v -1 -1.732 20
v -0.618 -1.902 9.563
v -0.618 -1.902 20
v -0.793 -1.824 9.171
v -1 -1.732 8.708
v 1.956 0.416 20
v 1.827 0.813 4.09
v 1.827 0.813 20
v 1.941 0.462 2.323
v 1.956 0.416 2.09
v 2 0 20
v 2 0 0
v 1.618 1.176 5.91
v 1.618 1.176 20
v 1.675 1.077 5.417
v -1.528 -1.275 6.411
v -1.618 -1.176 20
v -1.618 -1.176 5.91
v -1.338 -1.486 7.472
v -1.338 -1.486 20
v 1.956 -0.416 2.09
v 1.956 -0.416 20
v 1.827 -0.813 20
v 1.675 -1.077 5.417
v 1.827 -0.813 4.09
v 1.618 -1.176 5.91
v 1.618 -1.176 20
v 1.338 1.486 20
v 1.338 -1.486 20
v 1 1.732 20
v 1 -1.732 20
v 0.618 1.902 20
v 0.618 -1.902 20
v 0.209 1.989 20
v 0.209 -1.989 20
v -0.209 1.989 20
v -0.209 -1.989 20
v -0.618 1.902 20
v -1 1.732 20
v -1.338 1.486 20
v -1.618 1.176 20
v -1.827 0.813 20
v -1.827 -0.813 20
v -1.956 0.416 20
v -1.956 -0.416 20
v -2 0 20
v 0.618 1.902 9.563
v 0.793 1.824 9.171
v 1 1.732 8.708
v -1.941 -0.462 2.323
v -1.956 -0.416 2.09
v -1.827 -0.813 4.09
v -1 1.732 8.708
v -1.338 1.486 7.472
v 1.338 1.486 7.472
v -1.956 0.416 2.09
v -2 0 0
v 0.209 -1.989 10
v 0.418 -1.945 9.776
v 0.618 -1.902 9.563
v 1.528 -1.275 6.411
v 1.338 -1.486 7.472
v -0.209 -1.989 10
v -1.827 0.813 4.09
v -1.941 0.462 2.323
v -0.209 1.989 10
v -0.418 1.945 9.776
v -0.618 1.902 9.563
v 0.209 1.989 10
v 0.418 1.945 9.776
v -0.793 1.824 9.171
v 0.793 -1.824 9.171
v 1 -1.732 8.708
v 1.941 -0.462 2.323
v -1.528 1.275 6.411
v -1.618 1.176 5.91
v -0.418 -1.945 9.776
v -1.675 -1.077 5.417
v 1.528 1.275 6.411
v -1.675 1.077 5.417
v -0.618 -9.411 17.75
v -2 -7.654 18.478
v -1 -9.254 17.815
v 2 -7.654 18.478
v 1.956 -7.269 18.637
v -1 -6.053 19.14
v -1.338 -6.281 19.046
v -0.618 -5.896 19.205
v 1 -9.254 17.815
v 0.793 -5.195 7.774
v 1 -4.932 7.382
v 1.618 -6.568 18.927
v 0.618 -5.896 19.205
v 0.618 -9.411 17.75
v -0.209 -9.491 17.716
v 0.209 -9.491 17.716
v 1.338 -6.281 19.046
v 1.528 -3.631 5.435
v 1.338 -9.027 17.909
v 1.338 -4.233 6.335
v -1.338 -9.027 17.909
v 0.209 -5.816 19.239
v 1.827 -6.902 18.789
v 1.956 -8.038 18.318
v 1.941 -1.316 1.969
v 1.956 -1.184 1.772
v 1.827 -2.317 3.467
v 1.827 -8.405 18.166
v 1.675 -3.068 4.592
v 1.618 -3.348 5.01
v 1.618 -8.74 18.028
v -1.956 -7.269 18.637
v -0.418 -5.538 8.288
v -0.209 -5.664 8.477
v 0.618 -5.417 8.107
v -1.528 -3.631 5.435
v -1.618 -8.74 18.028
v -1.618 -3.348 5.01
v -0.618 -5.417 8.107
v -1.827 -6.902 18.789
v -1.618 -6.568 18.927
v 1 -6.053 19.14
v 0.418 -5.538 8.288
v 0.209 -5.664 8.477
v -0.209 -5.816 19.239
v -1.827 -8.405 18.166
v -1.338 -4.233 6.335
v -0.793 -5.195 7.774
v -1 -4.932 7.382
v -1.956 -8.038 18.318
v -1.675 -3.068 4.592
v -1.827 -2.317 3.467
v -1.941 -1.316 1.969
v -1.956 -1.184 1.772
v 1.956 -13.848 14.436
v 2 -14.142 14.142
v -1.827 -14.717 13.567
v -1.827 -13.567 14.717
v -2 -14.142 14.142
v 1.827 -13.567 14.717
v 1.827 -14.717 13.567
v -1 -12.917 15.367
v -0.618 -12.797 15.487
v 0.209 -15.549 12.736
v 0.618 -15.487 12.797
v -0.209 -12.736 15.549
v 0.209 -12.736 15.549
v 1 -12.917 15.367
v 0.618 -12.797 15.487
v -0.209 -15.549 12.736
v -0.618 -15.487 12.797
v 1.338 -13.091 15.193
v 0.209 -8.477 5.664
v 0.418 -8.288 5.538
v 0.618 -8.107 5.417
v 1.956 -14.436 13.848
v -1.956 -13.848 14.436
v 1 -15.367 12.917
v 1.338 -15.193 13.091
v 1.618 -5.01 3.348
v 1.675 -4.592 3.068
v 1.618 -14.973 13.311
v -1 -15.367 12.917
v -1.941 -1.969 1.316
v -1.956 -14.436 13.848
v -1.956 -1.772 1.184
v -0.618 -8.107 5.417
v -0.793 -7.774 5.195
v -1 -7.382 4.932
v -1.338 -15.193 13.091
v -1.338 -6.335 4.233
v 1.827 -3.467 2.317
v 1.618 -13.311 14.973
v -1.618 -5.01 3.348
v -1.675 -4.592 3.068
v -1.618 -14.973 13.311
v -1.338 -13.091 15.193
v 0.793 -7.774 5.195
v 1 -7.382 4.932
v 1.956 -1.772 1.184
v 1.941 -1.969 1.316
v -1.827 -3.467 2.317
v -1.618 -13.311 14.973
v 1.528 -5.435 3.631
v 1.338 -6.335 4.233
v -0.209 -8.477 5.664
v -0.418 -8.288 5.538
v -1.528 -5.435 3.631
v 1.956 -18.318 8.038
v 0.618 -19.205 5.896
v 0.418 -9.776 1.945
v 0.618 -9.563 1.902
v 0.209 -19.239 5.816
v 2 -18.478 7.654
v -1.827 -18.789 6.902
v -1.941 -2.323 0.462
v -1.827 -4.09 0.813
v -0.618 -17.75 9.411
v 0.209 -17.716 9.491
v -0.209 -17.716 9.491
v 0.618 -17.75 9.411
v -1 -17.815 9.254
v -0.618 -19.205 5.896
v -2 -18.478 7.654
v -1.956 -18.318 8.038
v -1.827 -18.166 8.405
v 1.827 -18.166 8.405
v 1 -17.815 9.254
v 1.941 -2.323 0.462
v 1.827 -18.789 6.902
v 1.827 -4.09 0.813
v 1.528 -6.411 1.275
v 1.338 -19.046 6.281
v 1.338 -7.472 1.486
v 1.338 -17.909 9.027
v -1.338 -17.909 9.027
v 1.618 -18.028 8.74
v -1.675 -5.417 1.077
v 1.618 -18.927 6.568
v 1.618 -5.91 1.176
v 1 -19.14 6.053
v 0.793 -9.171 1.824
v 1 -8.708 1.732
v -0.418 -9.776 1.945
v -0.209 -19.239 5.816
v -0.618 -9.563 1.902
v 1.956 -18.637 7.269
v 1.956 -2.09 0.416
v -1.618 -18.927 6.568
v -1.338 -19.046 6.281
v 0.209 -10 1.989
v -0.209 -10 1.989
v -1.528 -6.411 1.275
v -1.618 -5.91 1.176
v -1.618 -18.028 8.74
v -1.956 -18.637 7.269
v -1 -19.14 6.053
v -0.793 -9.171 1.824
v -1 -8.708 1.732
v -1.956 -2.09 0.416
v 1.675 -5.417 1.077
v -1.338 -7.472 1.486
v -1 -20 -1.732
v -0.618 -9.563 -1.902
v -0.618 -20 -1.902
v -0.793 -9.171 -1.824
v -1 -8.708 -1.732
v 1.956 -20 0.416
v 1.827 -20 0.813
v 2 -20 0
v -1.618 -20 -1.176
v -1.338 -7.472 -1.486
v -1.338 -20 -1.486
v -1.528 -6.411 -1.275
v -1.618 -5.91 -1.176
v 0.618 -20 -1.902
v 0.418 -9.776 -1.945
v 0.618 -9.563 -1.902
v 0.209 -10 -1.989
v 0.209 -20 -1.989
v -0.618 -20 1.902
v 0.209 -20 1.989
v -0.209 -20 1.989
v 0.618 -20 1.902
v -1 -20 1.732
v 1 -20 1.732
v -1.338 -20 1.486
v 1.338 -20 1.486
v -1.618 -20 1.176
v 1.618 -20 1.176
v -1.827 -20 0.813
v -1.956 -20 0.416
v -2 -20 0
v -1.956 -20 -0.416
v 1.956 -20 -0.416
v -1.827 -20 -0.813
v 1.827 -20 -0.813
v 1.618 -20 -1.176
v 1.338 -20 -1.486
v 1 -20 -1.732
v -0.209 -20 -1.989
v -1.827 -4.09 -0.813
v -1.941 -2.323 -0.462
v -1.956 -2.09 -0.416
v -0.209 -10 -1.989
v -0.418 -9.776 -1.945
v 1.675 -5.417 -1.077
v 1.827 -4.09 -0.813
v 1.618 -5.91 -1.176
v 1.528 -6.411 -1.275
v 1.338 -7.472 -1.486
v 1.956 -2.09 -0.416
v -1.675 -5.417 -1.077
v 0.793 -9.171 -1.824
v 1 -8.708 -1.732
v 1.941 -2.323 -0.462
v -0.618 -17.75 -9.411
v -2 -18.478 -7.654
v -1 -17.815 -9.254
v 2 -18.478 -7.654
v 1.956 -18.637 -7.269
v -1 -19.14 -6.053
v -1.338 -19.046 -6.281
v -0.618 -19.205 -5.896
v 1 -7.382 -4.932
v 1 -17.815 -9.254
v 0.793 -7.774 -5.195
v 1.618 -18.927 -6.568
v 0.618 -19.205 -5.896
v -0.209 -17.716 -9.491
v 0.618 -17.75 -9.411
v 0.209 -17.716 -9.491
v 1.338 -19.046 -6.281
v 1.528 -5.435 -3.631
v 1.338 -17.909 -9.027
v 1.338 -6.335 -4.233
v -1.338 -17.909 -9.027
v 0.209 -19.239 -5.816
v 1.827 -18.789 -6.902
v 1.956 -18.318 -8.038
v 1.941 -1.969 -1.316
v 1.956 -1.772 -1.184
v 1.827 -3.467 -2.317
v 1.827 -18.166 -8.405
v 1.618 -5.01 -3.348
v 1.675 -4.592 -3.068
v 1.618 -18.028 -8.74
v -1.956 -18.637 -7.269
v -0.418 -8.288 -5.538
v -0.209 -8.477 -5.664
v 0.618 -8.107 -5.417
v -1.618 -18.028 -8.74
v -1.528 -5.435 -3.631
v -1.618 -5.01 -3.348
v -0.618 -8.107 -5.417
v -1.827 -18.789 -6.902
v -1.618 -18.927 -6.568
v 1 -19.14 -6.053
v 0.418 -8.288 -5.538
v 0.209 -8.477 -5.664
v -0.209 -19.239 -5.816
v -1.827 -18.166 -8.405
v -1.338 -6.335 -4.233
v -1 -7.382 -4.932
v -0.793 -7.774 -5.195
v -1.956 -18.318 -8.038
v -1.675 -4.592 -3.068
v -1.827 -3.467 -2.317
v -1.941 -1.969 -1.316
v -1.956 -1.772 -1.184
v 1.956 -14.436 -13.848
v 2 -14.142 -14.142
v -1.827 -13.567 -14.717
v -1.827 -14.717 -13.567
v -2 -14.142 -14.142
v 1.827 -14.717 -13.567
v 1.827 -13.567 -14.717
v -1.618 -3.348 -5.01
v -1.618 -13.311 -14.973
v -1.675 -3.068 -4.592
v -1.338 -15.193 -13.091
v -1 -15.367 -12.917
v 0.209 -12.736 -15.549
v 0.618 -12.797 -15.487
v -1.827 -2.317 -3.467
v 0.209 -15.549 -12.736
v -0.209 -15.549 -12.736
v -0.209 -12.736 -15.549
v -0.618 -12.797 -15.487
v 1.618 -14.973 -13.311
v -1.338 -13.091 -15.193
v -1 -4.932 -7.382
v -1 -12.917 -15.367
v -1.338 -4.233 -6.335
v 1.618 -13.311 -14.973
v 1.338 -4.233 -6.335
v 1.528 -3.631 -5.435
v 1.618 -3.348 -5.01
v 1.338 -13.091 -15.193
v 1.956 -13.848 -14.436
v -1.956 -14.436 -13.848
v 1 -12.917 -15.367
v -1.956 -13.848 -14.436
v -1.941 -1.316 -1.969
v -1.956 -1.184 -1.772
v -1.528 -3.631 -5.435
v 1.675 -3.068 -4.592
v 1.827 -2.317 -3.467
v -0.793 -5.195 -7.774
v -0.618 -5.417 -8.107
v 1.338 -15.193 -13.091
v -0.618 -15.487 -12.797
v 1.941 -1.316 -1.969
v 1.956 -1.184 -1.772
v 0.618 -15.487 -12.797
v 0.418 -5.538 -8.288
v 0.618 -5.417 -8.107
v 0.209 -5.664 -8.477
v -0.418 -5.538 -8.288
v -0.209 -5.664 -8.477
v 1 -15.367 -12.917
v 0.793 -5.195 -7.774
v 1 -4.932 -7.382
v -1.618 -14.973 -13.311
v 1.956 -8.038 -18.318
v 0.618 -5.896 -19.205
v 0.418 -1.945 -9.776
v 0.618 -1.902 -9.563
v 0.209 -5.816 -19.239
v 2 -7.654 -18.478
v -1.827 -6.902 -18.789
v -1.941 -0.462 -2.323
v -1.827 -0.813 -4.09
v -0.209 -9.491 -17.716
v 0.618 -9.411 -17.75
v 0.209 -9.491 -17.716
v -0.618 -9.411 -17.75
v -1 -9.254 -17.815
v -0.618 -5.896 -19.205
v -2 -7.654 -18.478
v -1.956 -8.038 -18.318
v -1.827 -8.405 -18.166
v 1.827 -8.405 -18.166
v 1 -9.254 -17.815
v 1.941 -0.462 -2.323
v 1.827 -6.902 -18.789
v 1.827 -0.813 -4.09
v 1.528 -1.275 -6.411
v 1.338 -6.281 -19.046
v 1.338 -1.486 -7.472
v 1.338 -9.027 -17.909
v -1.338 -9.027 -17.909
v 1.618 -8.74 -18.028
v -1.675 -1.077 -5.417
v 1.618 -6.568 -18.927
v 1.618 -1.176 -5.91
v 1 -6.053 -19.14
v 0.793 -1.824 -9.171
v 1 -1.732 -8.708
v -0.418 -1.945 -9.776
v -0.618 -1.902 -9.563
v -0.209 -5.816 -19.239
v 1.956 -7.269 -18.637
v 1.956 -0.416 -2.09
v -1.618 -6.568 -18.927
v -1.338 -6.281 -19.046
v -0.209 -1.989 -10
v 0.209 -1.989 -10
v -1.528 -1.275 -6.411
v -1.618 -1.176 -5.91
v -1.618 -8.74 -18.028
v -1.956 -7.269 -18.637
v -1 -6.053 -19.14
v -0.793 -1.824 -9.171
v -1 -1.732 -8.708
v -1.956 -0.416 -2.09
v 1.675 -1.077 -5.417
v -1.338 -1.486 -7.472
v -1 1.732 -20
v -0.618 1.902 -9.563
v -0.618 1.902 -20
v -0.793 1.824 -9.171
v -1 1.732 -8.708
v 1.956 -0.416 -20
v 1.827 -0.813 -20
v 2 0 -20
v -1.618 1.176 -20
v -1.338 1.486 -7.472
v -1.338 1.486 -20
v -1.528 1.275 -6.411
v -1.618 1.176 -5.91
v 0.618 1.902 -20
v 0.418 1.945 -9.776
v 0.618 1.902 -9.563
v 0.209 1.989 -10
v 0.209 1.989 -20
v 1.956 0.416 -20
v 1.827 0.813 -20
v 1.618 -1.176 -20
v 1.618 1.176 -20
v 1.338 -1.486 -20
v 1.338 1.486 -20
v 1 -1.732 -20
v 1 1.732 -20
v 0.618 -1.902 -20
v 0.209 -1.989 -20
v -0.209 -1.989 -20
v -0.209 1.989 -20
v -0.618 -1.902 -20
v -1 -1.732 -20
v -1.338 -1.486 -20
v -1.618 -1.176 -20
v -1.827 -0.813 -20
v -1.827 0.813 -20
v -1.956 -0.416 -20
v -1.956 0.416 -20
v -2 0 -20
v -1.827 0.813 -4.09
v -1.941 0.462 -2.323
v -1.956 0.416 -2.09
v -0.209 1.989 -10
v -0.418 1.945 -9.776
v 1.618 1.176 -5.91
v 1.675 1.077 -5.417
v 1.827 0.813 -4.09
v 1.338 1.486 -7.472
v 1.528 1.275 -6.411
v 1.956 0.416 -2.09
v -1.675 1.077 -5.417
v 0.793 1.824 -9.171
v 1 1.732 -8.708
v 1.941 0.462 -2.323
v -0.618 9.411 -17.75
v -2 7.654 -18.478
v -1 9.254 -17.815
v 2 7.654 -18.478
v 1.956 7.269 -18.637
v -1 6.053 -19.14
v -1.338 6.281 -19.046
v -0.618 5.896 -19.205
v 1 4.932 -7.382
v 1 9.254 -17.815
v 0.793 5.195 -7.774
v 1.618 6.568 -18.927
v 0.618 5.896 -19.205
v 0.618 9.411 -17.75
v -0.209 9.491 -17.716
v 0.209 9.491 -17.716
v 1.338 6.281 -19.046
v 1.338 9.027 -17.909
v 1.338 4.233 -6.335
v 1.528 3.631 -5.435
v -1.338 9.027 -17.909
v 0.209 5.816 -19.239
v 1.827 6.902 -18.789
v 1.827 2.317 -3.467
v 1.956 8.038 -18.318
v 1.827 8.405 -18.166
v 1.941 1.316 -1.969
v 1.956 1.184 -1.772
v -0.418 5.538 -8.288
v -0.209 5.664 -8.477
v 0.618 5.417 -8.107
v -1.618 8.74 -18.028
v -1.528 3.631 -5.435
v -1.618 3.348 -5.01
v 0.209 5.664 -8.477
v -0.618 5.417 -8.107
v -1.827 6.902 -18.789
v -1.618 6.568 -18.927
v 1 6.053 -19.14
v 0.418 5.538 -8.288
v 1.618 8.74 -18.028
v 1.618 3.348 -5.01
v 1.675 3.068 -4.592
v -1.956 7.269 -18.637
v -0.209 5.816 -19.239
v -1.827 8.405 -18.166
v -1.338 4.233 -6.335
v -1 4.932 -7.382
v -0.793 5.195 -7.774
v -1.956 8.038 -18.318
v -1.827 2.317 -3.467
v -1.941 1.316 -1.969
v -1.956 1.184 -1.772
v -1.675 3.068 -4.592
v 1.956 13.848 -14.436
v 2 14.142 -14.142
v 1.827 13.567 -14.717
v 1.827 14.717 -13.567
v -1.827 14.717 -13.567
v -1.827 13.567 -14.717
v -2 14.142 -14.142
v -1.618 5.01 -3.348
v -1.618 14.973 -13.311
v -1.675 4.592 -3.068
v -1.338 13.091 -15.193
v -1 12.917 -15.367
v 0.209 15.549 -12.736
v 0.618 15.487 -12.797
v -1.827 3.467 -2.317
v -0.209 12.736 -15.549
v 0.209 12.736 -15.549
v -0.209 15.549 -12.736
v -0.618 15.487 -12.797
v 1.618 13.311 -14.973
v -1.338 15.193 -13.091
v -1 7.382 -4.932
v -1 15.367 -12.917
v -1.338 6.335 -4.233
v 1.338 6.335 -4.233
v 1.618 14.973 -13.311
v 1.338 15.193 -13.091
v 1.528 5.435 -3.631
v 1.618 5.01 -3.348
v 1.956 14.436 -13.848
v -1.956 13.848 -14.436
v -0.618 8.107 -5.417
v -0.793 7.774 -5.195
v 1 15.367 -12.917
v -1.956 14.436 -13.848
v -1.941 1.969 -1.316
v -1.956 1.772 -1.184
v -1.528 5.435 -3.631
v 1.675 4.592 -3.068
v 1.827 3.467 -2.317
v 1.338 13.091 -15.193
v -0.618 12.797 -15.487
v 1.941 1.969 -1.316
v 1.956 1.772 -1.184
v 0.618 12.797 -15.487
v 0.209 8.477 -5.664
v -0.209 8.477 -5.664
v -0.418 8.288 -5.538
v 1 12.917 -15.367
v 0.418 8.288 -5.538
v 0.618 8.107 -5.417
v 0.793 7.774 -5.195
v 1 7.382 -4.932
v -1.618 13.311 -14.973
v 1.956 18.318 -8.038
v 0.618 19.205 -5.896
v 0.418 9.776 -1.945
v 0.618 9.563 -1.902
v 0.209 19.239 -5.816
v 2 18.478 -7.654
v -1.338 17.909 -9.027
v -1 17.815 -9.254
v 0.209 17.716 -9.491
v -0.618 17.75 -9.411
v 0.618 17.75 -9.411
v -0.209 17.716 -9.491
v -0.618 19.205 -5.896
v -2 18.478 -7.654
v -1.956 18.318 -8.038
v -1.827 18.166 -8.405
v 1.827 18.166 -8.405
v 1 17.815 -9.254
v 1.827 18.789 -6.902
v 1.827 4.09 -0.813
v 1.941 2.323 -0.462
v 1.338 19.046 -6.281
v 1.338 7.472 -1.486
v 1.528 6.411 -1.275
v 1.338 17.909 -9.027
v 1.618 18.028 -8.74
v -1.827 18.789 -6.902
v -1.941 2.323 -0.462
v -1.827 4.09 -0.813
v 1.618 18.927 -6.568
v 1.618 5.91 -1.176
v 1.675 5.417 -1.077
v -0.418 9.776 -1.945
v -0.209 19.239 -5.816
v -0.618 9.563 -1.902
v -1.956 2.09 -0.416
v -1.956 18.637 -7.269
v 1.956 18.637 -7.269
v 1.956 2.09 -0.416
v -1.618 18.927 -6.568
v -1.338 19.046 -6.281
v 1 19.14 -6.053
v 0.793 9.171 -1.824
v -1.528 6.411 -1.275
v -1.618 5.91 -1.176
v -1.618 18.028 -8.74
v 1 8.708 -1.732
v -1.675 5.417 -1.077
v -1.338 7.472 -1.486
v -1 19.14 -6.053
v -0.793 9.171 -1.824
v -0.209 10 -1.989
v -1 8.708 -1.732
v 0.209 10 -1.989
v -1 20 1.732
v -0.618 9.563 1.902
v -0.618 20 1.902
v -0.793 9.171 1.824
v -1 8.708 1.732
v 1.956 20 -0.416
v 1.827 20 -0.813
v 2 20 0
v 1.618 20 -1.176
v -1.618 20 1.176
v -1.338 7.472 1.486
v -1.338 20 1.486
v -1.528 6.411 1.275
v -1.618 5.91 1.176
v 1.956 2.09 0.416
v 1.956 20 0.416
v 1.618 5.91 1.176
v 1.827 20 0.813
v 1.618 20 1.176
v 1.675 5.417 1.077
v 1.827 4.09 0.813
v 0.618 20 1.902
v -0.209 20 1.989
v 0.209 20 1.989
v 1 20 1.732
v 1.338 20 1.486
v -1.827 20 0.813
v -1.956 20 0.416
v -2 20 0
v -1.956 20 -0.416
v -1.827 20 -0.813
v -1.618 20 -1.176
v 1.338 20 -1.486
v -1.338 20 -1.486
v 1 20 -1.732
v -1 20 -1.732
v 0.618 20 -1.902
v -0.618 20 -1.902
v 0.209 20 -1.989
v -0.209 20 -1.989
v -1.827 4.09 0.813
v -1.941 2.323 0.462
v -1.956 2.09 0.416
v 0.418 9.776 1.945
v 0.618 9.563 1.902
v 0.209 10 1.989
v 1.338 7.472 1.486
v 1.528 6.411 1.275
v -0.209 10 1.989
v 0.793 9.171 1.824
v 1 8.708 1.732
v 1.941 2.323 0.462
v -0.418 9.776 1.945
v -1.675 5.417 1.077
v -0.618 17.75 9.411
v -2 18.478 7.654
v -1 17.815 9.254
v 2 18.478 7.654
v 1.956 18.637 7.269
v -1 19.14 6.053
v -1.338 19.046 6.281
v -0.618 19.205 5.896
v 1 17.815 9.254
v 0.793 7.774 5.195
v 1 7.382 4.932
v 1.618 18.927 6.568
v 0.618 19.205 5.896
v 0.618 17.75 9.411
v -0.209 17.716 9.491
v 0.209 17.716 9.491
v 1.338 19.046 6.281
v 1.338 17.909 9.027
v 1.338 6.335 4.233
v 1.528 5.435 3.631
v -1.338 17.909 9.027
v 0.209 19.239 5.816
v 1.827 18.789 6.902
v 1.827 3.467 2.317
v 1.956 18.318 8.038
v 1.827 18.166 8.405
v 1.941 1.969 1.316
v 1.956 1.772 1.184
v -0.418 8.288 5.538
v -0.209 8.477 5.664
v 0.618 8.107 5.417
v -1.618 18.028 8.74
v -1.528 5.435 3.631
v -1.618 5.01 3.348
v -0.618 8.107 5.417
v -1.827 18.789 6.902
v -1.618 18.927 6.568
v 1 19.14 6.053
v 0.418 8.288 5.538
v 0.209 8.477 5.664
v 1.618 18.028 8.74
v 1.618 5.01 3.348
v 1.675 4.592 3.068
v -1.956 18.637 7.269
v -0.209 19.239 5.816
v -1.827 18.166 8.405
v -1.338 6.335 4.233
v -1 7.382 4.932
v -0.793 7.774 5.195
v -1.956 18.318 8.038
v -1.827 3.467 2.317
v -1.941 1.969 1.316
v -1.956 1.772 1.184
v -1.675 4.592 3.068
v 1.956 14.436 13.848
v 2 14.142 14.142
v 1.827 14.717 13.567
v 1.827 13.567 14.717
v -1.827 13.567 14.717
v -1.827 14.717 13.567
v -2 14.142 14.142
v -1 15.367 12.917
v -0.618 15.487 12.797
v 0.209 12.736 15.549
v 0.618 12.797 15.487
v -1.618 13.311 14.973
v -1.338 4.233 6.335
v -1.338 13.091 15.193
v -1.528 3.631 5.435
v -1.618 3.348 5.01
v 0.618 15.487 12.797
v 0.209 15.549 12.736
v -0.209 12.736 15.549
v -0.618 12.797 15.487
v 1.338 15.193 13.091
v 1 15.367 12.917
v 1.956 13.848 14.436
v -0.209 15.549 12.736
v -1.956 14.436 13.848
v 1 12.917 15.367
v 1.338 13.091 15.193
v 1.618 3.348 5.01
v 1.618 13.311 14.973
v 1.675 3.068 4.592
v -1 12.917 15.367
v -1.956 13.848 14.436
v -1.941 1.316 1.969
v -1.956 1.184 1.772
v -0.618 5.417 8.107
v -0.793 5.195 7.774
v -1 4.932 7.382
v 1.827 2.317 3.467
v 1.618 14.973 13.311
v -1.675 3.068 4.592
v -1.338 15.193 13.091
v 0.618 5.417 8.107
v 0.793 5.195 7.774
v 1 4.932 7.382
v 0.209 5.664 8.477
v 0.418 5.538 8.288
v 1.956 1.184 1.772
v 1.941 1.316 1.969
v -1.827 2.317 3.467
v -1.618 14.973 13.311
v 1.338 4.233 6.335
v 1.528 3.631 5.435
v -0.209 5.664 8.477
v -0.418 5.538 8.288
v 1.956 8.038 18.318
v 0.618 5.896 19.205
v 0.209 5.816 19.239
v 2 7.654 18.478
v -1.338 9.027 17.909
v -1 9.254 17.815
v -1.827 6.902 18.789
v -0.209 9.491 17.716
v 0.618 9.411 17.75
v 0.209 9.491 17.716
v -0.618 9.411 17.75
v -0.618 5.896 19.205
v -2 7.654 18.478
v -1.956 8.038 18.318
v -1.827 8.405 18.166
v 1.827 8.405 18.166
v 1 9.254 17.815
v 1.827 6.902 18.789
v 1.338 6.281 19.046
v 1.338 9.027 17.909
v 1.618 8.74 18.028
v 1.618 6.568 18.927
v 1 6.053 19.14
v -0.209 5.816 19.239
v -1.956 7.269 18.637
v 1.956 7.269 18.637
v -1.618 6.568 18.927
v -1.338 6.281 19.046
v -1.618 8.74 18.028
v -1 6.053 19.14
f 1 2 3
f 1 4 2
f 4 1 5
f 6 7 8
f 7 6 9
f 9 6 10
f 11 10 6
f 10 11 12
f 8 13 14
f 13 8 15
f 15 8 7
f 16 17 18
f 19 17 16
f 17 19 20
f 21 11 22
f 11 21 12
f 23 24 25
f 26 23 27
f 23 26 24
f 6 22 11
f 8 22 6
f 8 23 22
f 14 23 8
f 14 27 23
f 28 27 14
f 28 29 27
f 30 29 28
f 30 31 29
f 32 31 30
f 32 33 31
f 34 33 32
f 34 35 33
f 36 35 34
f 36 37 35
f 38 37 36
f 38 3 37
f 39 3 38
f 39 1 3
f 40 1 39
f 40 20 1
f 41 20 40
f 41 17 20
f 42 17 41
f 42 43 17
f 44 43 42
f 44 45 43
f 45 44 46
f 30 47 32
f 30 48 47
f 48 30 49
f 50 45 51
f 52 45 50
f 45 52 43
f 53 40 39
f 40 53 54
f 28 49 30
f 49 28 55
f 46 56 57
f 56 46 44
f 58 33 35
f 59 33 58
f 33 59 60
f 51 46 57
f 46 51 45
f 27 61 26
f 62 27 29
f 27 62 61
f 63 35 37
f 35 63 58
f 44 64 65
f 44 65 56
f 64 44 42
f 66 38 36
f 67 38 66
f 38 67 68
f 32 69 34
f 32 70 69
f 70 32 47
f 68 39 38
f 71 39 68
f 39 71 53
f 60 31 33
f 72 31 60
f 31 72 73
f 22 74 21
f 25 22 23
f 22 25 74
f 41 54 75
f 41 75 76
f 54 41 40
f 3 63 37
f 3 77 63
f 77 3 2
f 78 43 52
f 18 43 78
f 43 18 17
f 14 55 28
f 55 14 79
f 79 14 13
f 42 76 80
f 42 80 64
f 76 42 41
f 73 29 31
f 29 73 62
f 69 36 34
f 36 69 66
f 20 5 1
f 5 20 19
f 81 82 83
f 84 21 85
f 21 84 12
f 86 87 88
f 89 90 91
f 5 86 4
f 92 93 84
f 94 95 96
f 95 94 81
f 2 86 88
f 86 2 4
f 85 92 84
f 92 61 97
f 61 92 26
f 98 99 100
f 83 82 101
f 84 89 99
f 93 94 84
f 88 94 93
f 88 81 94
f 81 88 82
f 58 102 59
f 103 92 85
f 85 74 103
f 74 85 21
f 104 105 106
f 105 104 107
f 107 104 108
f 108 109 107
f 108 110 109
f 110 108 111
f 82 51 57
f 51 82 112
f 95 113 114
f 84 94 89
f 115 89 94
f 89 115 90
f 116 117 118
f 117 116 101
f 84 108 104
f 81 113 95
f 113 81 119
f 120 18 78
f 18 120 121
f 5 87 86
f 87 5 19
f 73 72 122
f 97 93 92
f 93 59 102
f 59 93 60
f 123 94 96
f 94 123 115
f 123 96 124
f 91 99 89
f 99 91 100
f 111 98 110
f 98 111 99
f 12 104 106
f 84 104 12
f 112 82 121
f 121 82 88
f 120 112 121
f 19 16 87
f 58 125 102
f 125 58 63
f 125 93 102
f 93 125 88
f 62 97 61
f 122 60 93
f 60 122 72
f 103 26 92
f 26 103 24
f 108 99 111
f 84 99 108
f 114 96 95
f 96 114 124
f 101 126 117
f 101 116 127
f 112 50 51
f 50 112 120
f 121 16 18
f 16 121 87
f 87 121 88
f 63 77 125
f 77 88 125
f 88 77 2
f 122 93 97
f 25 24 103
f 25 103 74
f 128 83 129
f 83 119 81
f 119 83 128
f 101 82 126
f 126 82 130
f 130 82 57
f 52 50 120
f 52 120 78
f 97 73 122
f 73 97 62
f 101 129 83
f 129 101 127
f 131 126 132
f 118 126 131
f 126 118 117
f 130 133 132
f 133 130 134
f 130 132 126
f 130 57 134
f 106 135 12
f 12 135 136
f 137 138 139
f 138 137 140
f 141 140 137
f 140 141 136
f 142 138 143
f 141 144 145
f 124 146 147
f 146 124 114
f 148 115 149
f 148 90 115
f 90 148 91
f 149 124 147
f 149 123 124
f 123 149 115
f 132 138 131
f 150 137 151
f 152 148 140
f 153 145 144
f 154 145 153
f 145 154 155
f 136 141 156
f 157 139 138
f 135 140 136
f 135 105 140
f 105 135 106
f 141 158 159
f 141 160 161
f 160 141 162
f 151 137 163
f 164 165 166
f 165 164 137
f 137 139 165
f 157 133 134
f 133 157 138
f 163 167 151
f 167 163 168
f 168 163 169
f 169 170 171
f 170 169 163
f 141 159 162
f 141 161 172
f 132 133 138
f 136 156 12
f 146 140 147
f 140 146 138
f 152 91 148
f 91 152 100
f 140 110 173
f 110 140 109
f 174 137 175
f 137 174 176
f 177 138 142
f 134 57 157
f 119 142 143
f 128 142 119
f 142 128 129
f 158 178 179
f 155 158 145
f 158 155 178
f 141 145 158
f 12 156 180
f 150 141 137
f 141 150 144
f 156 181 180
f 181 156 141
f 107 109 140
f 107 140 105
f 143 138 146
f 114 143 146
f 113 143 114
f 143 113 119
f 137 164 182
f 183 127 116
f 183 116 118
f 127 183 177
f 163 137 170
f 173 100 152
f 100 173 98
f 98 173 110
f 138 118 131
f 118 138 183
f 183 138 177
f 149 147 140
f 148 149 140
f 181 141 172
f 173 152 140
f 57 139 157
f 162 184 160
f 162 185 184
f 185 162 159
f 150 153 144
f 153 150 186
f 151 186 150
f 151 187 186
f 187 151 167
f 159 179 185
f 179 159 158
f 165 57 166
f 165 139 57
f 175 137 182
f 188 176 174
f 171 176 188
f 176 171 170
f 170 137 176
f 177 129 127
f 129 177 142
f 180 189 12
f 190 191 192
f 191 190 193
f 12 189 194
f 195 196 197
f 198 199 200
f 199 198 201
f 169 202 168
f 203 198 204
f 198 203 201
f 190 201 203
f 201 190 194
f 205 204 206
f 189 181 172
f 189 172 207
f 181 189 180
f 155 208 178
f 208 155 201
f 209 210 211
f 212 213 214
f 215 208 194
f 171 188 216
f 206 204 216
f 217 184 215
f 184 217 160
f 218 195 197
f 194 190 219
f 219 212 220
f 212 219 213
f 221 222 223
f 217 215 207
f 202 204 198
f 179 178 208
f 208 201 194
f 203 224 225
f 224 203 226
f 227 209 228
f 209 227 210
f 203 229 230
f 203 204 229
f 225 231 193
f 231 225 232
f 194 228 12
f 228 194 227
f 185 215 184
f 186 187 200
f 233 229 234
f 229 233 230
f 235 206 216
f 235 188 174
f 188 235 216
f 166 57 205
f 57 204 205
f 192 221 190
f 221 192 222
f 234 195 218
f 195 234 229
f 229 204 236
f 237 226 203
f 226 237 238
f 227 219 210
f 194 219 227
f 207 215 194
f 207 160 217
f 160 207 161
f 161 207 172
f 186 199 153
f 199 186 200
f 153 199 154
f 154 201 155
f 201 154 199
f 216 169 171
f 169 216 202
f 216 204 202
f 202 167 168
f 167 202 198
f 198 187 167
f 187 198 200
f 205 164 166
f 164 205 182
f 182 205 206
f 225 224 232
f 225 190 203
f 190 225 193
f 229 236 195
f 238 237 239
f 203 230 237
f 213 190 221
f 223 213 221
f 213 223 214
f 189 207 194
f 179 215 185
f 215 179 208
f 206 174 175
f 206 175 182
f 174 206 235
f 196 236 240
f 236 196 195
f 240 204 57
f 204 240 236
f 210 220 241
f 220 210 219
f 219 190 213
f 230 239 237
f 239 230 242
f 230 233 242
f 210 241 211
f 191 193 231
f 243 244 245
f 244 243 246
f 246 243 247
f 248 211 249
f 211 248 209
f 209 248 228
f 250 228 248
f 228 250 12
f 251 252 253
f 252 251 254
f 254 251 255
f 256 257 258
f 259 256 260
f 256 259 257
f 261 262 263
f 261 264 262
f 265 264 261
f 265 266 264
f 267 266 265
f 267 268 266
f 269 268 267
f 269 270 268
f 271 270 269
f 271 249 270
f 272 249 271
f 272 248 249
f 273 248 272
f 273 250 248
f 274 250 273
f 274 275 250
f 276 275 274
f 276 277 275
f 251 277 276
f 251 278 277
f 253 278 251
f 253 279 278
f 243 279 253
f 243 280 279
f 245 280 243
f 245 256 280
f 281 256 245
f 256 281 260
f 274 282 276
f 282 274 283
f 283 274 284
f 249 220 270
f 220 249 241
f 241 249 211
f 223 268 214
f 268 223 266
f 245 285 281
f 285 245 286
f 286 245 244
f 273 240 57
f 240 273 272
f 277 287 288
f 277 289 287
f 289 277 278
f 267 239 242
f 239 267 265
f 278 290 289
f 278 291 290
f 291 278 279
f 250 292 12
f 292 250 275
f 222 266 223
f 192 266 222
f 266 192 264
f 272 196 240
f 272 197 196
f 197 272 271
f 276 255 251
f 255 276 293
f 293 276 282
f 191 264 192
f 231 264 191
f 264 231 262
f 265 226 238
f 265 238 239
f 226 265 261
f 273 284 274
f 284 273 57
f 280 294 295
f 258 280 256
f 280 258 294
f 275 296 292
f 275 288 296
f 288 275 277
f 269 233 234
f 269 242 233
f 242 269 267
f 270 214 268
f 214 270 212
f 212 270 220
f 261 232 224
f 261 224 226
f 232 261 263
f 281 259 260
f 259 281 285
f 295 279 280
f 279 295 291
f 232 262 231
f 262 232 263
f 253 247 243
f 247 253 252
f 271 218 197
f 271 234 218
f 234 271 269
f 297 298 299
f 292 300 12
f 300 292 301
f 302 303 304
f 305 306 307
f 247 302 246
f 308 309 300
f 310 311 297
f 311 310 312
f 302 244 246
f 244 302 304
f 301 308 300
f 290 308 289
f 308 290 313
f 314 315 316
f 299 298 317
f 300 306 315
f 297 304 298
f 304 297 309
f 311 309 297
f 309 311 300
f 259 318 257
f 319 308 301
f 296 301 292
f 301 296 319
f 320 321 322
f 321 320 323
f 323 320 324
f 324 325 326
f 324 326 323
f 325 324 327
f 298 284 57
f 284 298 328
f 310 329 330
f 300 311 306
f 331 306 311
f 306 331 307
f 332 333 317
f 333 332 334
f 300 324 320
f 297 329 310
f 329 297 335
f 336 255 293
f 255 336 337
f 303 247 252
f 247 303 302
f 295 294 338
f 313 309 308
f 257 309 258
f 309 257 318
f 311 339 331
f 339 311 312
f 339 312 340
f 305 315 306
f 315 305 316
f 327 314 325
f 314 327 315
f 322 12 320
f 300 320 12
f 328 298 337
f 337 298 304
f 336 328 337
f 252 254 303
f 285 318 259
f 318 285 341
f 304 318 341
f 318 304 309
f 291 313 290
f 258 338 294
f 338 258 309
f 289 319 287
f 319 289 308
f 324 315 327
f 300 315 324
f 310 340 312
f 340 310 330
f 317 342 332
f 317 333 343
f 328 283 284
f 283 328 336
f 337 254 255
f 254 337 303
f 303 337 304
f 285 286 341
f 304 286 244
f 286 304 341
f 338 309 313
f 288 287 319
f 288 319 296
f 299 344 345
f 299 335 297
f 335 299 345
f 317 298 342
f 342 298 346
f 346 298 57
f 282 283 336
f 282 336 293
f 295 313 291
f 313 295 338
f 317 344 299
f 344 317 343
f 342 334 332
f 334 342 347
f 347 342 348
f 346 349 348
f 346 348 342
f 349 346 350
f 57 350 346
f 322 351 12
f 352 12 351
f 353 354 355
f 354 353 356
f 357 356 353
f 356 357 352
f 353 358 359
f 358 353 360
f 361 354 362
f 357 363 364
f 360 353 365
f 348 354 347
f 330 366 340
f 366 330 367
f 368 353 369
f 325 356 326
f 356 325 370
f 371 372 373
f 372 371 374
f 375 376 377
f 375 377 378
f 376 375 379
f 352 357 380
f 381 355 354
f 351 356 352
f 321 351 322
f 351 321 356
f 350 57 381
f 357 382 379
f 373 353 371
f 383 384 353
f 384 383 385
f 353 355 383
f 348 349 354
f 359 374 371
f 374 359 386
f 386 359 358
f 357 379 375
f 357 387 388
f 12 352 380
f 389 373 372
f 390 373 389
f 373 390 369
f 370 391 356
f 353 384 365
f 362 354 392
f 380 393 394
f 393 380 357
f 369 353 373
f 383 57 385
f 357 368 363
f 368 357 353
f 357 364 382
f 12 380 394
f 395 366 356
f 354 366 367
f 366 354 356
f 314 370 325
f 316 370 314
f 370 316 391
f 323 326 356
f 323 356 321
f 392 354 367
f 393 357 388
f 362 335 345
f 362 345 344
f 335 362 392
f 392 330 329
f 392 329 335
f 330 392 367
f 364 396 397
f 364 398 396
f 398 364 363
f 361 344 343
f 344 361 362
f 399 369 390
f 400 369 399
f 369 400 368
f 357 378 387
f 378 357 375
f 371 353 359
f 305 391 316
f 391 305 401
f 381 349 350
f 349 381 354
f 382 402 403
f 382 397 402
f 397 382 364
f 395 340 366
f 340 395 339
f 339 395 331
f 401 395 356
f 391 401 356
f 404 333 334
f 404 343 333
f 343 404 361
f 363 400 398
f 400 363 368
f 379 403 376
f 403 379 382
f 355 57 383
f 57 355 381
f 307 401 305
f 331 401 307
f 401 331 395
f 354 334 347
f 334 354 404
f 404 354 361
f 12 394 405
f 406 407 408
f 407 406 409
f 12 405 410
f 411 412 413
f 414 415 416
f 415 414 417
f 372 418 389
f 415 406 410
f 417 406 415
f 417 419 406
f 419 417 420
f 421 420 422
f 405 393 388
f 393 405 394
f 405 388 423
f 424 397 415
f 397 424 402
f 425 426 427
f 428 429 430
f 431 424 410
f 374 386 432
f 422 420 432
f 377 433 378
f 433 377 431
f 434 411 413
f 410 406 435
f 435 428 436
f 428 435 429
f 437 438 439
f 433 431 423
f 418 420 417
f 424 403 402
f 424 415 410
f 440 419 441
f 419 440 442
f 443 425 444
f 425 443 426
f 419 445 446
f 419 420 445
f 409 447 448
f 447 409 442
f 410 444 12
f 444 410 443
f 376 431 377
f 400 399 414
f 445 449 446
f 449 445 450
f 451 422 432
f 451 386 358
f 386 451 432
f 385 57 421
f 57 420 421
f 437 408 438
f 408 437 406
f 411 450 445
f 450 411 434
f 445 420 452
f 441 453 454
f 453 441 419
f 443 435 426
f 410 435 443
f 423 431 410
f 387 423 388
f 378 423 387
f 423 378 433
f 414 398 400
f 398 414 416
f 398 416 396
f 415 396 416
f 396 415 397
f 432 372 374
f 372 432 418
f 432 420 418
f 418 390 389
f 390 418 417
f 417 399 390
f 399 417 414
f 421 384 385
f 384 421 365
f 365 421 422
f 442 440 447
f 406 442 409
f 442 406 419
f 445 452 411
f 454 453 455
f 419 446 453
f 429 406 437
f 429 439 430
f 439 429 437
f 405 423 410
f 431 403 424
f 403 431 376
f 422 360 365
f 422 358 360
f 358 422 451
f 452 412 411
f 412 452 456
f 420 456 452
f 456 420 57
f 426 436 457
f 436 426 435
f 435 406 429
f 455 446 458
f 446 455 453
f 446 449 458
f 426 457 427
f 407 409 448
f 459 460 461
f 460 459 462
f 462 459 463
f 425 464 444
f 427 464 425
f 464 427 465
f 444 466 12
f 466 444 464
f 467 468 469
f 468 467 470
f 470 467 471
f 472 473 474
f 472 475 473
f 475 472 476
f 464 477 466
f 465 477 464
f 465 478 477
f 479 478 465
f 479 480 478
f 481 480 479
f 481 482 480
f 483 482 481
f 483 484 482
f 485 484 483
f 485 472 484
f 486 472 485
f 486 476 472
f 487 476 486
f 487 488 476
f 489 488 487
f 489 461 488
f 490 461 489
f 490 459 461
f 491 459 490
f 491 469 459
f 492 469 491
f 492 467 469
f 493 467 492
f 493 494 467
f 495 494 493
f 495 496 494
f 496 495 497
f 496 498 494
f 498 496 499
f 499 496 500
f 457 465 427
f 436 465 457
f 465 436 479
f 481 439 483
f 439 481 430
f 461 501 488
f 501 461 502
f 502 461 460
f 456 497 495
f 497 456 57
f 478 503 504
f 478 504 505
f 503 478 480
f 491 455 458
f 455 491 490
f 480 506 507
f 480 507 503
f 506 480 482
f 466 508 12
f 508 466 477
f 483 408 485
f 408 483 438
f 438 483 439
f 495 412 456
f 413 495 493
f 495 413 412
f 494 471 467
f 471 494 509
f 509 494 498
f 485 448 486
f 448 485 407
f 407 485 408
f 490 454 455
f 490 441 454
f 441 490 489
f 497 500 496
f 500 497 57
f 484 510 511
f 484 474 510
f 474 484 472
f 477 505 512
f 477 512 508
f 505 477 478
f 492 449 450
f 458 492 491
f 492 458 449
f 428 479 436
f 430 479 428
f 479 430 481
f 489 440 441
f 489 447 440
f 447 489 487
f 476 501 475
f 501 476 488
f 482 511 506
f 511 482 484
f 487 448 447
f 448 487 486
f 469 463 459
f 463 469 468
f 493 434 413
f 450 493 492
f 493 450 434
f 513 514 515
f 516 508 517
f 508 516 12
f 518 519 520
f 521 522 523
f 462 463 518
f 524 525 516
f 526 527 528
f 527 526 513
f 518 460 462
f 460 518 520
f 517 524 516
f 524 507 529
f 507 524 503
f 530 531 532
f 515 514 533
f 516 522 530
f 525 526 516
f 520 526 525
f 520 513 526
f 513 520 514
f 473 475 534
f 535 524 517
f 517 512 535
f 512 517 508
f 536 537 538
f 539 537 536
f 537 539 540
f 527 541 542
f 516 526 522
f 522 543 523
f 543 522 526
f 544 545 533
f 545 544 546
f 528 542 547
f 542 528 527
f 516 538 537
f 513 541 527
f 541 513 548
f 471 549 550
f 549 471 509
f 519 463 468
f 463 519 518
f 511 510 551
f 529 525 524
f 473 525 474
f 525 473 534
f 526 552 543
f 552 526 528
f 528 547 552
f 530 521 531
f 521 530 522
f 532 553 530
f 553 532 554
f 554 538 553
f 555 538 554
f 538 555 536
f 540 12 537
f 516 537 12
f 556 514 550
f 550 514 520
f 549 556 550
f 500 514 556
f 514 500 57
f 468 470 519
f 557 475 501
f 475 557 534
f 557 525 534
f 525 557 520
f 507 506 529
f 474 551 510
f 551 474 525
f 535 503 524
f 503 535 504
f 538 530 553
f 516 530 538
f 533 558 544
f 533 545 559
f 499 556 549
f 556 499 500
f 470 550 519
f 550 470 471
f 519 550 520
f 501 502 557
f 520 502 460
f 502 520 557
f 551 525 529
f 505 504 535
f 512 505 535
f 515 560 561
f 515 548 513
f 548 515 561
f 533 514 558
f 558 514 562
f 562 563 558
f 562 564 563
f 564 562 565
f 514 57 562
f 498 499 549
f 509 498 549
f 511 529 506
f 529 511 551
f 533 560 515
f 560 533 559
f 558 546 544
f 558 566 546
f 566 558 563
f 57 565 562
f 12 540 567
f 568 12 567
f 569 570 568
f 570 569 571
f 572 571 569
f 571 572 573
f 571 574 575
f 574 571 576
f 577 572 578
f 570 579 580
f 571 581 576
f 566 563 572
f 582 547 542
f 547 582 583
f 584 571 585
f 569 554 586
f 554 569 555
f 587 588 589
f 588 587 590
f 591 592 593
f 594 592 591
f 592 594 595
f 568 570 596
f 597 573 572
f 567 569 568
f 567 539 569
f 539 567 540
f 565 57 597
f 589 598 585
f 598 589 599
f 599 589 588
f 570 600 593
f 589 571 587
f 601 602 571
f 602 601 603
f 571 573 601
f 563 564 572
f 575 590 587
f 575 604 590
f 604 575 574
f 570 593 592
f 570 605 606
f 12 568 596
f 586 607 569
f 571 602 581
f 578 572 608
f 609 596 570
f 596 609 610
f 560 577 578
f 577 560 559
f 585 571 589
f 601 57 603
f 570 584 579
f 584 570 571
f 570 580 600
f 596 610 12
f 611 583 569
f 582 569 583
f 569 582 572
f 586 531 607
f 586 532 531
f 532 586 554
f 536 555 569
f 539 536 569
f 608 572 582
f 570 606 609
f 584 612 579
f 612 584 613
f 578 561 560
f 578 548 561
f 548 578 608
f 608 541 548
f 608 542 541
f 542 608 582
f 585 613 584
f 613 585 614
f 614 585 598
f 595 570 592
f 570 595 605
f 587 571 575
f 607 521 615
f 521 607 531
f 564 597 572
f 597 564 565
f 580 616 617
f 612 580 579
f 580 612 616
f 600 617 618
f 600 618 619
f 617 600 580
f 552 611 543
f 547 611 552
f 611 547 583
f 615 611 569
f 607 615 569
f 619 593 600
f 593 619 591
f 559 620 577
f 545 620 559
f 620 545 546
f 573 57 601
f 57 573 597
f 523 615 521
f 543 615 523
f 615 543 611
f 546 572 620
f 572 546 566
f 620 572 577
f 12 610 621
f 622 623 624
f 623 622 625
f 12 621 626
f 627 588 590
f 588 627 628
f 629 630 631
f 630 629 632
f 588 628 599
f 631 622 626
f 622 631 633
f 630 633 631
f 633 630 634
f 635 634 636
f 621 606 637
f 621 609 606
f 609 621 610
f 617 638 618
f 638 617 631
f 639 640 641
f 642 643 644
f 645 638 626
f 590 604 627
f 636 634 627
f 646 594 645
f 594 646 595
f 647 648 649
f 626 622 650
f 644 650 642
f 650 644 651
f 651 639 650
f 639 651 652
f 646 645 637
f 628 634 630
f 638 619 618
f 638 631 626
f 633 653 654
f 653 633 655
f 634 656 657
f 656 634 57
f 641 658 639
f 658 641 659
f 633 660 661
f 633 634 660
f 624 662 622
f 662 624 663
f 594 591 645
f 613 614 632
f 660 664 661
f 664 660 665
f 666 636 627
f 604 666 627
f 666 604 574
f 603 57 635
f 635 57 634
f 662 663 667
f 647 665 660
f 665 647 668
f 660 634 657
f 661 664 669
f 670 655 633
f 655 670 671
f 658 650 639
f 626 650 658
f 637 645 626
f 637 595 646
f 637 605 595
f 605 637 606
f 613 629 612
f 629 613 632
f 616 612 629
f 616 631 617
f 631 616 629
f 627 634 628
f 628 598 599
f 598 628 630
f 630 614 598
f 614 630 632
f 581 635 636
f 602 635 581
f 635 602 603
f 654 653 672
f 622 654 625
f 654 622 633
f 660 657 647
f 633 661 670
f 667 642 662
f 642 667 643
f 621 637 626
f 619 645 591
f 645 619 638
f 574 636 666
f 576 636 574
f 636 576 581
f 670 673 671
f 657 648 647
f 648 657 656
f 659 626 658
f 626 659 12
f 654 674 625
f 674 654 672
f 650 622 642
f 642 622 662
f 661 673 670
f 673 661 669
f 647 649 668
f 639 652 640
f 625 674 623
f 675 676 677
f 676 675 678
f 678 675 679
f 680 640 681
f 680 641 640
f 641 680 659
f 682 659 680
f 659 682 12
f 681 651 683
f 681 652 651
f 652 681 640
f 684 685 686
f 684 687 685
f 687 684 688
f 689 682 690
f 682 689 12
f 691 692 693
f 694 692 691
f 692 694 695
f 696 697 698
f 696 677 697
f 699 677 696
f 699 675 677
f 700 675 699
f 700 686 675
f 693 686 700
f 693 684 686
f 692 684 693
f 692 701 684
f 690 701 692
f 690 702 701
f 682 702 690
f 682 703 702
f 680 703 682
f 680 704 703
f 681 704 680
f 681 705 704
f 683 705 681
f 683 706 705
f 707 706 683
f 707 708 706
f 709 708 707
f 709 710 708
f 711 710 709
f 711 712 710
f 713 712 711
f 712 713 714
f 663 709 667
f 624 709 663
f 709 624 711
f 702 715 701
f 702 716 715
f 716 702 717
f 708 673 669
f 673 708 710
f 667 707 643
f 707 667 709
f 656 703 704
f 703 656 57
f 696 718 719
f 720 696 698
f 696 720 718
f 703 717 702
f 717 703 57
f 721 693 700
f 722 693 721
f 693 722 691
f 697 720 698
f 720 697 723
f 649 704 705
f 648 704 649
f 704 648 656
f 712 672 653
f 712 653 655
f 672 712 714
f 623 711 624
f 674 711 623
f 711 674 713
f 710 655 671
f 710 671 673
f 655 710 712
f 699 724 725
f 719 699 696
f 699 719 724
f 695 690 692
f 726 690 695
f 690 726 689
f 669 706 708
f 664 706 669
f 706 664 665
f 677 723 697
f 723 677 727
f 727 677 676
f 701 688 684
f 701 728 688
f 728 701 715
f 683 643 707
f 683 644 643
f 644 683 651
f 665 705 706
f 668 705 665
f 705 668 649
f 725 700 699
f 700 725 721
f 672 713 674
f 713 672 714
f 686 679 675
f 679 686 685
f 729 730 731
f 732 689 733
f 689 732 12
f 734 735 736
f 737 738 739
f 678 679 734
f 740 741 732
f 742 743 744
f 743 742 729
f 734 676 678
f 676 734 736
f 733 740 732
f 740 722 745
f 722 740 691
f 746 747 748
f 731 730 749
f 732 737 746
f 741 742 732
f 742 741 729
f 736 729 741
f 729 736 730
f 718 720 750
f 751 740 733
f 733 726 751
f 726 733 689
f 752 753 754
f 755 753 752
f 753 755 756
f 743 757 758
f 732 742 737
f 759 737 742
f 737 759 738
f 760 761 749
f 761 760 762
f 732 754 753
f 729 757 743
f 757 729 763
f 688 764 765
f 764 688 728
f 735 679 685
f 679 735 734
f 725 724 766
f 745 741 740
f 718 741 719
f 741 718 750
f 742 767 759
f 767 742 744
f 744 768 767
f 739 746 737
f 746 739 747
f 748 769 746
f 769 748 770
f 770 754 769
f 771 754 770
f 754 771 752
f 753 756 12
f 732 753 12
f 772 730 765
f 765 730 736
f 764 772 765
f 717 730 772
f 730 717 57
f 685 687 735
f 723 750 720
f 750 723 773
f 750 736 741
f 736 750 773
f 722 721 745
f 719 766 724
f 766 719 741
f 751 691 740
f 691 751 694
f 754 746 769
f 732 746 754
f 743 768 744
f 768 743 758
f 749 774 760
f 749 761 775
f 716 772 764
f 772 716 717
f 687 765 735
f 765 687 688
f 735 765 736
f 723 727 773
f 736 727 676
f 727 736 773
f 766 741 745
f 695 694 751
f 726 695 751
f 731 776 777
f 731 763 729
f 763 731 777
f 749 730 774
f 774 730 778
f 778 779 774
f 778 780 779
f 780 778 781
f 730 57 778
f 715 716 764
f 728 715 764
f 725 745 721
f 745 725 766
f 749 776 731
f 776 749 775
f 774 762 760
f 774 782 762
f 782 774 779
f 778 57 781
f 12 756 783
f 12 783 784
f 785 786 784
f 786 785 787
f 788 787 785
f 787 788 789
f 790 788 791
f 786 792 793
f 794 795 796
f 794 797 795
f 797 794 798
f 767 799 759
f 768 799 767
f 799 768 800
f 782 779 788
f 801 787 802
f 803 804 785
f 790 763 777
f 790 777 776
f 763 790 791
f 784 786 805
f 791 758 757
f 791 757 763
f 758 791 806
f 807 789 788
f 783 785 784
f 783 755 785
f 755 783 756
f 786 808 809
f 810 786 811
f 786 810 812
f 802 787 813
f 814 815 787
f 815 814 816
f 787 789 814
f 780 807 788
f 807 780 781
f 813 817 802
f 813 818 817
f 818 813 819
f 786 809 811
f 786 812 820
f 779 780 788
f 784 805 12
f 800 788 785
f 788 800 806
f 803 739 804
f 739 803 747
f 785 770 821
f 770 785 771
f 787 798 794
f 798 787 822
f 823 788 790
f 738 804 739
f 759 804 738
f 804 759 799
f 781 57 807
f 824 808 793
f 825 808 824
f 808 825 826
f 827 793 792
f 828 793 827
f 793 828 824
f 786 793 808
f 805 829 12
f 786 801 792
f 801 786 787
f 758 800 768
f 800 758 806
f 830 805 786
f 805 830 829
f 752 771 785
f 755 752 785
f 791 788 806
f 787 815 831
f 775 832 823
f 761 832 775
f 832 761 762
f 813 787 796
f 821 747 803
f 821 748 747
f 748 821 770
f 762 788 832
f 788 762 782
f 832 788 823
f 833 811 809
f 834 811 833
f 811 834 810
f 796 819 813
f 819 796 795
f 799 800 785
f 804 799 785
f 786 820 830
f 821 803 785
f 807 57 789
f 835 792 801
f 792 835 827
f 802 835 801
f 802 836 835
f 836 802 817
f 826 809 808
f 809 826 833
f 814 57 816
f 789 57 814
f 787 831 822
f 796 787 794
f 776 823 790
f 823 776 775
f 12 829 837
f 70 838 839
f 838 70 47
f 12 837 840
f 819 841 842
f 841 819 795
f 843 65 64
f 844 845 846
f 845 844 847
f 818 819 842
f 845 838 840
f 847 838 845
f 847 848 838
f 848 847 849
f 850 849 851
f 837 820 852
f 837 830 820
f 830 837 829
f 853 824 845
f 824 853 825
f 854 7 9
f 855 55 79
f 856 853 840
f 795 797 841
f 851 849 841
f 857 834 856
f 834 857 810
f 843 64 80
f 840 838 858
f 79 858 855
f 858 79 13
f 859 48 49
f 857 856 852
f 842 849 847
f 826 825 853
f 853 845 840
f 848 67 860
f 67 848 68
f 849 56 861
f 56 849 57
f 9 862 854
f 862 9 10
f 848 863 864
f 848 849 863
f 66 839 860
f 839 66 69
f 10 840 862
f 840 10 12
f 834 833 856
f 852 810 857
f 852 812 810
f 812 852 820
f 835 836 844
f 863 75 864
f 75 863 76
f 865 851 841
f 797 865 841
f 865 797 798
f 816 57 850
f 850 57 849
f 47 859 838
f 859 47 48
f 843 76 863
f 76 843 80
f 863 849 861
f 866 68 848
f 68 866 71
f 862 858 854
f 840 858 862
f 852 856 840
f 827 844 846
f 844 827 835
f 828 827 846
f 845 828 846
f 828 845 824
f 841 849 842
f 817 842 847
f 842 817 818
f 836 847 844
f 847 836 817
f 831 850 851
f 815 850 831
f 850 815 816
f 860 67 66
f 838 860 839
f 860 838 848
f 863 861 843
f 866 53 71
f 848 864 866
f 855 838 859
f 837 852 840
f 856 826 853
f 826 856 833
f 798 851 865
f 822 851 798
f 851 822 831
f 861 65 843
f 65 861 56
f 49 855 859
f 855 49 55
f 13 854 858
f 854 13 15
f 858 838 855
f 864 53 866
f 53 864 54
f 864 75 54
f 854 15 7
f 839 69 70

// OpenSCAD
module holycube(cubeSize, r) {
    difference() {
        cube(cubeSize, center=true);
        sphere(r);
    }
}

module holyCubeAssembly(centerCubeSize, centerR, sideCubeDelta, sideRDelta) { 
sideCubeSize = centerCubeSize + sideCubeDelta;
sideR = centerR + sideRDelta;    
holycube(centerCubeSize,centerR);
translate([centerCubeSize,0])
    holycube(sideCubeSize, sideR);
translate([-centerCubeSize,0])
    holycube(sideCubeSize, sideR);
}

/*holyCubeAssembly(30, 19, 2, 3);
translate([0,28])
    holyCubeAssembly(30, 19, 2, 3);

*/
/*
for (z = [10:10:100]) {
  translate([0,0,z])
    for (y = [10:10:100]) {
        translate([0,y])
            for (x = [10:10:100]) {
                translate([x,0])
                    cube(8);
            }
    }
}
*/

for (a=[0:22.5:360-22.5]) {
    rotate(a, [1,0,0])
        cylinder(r=2,h=20, $fn=30);
}
